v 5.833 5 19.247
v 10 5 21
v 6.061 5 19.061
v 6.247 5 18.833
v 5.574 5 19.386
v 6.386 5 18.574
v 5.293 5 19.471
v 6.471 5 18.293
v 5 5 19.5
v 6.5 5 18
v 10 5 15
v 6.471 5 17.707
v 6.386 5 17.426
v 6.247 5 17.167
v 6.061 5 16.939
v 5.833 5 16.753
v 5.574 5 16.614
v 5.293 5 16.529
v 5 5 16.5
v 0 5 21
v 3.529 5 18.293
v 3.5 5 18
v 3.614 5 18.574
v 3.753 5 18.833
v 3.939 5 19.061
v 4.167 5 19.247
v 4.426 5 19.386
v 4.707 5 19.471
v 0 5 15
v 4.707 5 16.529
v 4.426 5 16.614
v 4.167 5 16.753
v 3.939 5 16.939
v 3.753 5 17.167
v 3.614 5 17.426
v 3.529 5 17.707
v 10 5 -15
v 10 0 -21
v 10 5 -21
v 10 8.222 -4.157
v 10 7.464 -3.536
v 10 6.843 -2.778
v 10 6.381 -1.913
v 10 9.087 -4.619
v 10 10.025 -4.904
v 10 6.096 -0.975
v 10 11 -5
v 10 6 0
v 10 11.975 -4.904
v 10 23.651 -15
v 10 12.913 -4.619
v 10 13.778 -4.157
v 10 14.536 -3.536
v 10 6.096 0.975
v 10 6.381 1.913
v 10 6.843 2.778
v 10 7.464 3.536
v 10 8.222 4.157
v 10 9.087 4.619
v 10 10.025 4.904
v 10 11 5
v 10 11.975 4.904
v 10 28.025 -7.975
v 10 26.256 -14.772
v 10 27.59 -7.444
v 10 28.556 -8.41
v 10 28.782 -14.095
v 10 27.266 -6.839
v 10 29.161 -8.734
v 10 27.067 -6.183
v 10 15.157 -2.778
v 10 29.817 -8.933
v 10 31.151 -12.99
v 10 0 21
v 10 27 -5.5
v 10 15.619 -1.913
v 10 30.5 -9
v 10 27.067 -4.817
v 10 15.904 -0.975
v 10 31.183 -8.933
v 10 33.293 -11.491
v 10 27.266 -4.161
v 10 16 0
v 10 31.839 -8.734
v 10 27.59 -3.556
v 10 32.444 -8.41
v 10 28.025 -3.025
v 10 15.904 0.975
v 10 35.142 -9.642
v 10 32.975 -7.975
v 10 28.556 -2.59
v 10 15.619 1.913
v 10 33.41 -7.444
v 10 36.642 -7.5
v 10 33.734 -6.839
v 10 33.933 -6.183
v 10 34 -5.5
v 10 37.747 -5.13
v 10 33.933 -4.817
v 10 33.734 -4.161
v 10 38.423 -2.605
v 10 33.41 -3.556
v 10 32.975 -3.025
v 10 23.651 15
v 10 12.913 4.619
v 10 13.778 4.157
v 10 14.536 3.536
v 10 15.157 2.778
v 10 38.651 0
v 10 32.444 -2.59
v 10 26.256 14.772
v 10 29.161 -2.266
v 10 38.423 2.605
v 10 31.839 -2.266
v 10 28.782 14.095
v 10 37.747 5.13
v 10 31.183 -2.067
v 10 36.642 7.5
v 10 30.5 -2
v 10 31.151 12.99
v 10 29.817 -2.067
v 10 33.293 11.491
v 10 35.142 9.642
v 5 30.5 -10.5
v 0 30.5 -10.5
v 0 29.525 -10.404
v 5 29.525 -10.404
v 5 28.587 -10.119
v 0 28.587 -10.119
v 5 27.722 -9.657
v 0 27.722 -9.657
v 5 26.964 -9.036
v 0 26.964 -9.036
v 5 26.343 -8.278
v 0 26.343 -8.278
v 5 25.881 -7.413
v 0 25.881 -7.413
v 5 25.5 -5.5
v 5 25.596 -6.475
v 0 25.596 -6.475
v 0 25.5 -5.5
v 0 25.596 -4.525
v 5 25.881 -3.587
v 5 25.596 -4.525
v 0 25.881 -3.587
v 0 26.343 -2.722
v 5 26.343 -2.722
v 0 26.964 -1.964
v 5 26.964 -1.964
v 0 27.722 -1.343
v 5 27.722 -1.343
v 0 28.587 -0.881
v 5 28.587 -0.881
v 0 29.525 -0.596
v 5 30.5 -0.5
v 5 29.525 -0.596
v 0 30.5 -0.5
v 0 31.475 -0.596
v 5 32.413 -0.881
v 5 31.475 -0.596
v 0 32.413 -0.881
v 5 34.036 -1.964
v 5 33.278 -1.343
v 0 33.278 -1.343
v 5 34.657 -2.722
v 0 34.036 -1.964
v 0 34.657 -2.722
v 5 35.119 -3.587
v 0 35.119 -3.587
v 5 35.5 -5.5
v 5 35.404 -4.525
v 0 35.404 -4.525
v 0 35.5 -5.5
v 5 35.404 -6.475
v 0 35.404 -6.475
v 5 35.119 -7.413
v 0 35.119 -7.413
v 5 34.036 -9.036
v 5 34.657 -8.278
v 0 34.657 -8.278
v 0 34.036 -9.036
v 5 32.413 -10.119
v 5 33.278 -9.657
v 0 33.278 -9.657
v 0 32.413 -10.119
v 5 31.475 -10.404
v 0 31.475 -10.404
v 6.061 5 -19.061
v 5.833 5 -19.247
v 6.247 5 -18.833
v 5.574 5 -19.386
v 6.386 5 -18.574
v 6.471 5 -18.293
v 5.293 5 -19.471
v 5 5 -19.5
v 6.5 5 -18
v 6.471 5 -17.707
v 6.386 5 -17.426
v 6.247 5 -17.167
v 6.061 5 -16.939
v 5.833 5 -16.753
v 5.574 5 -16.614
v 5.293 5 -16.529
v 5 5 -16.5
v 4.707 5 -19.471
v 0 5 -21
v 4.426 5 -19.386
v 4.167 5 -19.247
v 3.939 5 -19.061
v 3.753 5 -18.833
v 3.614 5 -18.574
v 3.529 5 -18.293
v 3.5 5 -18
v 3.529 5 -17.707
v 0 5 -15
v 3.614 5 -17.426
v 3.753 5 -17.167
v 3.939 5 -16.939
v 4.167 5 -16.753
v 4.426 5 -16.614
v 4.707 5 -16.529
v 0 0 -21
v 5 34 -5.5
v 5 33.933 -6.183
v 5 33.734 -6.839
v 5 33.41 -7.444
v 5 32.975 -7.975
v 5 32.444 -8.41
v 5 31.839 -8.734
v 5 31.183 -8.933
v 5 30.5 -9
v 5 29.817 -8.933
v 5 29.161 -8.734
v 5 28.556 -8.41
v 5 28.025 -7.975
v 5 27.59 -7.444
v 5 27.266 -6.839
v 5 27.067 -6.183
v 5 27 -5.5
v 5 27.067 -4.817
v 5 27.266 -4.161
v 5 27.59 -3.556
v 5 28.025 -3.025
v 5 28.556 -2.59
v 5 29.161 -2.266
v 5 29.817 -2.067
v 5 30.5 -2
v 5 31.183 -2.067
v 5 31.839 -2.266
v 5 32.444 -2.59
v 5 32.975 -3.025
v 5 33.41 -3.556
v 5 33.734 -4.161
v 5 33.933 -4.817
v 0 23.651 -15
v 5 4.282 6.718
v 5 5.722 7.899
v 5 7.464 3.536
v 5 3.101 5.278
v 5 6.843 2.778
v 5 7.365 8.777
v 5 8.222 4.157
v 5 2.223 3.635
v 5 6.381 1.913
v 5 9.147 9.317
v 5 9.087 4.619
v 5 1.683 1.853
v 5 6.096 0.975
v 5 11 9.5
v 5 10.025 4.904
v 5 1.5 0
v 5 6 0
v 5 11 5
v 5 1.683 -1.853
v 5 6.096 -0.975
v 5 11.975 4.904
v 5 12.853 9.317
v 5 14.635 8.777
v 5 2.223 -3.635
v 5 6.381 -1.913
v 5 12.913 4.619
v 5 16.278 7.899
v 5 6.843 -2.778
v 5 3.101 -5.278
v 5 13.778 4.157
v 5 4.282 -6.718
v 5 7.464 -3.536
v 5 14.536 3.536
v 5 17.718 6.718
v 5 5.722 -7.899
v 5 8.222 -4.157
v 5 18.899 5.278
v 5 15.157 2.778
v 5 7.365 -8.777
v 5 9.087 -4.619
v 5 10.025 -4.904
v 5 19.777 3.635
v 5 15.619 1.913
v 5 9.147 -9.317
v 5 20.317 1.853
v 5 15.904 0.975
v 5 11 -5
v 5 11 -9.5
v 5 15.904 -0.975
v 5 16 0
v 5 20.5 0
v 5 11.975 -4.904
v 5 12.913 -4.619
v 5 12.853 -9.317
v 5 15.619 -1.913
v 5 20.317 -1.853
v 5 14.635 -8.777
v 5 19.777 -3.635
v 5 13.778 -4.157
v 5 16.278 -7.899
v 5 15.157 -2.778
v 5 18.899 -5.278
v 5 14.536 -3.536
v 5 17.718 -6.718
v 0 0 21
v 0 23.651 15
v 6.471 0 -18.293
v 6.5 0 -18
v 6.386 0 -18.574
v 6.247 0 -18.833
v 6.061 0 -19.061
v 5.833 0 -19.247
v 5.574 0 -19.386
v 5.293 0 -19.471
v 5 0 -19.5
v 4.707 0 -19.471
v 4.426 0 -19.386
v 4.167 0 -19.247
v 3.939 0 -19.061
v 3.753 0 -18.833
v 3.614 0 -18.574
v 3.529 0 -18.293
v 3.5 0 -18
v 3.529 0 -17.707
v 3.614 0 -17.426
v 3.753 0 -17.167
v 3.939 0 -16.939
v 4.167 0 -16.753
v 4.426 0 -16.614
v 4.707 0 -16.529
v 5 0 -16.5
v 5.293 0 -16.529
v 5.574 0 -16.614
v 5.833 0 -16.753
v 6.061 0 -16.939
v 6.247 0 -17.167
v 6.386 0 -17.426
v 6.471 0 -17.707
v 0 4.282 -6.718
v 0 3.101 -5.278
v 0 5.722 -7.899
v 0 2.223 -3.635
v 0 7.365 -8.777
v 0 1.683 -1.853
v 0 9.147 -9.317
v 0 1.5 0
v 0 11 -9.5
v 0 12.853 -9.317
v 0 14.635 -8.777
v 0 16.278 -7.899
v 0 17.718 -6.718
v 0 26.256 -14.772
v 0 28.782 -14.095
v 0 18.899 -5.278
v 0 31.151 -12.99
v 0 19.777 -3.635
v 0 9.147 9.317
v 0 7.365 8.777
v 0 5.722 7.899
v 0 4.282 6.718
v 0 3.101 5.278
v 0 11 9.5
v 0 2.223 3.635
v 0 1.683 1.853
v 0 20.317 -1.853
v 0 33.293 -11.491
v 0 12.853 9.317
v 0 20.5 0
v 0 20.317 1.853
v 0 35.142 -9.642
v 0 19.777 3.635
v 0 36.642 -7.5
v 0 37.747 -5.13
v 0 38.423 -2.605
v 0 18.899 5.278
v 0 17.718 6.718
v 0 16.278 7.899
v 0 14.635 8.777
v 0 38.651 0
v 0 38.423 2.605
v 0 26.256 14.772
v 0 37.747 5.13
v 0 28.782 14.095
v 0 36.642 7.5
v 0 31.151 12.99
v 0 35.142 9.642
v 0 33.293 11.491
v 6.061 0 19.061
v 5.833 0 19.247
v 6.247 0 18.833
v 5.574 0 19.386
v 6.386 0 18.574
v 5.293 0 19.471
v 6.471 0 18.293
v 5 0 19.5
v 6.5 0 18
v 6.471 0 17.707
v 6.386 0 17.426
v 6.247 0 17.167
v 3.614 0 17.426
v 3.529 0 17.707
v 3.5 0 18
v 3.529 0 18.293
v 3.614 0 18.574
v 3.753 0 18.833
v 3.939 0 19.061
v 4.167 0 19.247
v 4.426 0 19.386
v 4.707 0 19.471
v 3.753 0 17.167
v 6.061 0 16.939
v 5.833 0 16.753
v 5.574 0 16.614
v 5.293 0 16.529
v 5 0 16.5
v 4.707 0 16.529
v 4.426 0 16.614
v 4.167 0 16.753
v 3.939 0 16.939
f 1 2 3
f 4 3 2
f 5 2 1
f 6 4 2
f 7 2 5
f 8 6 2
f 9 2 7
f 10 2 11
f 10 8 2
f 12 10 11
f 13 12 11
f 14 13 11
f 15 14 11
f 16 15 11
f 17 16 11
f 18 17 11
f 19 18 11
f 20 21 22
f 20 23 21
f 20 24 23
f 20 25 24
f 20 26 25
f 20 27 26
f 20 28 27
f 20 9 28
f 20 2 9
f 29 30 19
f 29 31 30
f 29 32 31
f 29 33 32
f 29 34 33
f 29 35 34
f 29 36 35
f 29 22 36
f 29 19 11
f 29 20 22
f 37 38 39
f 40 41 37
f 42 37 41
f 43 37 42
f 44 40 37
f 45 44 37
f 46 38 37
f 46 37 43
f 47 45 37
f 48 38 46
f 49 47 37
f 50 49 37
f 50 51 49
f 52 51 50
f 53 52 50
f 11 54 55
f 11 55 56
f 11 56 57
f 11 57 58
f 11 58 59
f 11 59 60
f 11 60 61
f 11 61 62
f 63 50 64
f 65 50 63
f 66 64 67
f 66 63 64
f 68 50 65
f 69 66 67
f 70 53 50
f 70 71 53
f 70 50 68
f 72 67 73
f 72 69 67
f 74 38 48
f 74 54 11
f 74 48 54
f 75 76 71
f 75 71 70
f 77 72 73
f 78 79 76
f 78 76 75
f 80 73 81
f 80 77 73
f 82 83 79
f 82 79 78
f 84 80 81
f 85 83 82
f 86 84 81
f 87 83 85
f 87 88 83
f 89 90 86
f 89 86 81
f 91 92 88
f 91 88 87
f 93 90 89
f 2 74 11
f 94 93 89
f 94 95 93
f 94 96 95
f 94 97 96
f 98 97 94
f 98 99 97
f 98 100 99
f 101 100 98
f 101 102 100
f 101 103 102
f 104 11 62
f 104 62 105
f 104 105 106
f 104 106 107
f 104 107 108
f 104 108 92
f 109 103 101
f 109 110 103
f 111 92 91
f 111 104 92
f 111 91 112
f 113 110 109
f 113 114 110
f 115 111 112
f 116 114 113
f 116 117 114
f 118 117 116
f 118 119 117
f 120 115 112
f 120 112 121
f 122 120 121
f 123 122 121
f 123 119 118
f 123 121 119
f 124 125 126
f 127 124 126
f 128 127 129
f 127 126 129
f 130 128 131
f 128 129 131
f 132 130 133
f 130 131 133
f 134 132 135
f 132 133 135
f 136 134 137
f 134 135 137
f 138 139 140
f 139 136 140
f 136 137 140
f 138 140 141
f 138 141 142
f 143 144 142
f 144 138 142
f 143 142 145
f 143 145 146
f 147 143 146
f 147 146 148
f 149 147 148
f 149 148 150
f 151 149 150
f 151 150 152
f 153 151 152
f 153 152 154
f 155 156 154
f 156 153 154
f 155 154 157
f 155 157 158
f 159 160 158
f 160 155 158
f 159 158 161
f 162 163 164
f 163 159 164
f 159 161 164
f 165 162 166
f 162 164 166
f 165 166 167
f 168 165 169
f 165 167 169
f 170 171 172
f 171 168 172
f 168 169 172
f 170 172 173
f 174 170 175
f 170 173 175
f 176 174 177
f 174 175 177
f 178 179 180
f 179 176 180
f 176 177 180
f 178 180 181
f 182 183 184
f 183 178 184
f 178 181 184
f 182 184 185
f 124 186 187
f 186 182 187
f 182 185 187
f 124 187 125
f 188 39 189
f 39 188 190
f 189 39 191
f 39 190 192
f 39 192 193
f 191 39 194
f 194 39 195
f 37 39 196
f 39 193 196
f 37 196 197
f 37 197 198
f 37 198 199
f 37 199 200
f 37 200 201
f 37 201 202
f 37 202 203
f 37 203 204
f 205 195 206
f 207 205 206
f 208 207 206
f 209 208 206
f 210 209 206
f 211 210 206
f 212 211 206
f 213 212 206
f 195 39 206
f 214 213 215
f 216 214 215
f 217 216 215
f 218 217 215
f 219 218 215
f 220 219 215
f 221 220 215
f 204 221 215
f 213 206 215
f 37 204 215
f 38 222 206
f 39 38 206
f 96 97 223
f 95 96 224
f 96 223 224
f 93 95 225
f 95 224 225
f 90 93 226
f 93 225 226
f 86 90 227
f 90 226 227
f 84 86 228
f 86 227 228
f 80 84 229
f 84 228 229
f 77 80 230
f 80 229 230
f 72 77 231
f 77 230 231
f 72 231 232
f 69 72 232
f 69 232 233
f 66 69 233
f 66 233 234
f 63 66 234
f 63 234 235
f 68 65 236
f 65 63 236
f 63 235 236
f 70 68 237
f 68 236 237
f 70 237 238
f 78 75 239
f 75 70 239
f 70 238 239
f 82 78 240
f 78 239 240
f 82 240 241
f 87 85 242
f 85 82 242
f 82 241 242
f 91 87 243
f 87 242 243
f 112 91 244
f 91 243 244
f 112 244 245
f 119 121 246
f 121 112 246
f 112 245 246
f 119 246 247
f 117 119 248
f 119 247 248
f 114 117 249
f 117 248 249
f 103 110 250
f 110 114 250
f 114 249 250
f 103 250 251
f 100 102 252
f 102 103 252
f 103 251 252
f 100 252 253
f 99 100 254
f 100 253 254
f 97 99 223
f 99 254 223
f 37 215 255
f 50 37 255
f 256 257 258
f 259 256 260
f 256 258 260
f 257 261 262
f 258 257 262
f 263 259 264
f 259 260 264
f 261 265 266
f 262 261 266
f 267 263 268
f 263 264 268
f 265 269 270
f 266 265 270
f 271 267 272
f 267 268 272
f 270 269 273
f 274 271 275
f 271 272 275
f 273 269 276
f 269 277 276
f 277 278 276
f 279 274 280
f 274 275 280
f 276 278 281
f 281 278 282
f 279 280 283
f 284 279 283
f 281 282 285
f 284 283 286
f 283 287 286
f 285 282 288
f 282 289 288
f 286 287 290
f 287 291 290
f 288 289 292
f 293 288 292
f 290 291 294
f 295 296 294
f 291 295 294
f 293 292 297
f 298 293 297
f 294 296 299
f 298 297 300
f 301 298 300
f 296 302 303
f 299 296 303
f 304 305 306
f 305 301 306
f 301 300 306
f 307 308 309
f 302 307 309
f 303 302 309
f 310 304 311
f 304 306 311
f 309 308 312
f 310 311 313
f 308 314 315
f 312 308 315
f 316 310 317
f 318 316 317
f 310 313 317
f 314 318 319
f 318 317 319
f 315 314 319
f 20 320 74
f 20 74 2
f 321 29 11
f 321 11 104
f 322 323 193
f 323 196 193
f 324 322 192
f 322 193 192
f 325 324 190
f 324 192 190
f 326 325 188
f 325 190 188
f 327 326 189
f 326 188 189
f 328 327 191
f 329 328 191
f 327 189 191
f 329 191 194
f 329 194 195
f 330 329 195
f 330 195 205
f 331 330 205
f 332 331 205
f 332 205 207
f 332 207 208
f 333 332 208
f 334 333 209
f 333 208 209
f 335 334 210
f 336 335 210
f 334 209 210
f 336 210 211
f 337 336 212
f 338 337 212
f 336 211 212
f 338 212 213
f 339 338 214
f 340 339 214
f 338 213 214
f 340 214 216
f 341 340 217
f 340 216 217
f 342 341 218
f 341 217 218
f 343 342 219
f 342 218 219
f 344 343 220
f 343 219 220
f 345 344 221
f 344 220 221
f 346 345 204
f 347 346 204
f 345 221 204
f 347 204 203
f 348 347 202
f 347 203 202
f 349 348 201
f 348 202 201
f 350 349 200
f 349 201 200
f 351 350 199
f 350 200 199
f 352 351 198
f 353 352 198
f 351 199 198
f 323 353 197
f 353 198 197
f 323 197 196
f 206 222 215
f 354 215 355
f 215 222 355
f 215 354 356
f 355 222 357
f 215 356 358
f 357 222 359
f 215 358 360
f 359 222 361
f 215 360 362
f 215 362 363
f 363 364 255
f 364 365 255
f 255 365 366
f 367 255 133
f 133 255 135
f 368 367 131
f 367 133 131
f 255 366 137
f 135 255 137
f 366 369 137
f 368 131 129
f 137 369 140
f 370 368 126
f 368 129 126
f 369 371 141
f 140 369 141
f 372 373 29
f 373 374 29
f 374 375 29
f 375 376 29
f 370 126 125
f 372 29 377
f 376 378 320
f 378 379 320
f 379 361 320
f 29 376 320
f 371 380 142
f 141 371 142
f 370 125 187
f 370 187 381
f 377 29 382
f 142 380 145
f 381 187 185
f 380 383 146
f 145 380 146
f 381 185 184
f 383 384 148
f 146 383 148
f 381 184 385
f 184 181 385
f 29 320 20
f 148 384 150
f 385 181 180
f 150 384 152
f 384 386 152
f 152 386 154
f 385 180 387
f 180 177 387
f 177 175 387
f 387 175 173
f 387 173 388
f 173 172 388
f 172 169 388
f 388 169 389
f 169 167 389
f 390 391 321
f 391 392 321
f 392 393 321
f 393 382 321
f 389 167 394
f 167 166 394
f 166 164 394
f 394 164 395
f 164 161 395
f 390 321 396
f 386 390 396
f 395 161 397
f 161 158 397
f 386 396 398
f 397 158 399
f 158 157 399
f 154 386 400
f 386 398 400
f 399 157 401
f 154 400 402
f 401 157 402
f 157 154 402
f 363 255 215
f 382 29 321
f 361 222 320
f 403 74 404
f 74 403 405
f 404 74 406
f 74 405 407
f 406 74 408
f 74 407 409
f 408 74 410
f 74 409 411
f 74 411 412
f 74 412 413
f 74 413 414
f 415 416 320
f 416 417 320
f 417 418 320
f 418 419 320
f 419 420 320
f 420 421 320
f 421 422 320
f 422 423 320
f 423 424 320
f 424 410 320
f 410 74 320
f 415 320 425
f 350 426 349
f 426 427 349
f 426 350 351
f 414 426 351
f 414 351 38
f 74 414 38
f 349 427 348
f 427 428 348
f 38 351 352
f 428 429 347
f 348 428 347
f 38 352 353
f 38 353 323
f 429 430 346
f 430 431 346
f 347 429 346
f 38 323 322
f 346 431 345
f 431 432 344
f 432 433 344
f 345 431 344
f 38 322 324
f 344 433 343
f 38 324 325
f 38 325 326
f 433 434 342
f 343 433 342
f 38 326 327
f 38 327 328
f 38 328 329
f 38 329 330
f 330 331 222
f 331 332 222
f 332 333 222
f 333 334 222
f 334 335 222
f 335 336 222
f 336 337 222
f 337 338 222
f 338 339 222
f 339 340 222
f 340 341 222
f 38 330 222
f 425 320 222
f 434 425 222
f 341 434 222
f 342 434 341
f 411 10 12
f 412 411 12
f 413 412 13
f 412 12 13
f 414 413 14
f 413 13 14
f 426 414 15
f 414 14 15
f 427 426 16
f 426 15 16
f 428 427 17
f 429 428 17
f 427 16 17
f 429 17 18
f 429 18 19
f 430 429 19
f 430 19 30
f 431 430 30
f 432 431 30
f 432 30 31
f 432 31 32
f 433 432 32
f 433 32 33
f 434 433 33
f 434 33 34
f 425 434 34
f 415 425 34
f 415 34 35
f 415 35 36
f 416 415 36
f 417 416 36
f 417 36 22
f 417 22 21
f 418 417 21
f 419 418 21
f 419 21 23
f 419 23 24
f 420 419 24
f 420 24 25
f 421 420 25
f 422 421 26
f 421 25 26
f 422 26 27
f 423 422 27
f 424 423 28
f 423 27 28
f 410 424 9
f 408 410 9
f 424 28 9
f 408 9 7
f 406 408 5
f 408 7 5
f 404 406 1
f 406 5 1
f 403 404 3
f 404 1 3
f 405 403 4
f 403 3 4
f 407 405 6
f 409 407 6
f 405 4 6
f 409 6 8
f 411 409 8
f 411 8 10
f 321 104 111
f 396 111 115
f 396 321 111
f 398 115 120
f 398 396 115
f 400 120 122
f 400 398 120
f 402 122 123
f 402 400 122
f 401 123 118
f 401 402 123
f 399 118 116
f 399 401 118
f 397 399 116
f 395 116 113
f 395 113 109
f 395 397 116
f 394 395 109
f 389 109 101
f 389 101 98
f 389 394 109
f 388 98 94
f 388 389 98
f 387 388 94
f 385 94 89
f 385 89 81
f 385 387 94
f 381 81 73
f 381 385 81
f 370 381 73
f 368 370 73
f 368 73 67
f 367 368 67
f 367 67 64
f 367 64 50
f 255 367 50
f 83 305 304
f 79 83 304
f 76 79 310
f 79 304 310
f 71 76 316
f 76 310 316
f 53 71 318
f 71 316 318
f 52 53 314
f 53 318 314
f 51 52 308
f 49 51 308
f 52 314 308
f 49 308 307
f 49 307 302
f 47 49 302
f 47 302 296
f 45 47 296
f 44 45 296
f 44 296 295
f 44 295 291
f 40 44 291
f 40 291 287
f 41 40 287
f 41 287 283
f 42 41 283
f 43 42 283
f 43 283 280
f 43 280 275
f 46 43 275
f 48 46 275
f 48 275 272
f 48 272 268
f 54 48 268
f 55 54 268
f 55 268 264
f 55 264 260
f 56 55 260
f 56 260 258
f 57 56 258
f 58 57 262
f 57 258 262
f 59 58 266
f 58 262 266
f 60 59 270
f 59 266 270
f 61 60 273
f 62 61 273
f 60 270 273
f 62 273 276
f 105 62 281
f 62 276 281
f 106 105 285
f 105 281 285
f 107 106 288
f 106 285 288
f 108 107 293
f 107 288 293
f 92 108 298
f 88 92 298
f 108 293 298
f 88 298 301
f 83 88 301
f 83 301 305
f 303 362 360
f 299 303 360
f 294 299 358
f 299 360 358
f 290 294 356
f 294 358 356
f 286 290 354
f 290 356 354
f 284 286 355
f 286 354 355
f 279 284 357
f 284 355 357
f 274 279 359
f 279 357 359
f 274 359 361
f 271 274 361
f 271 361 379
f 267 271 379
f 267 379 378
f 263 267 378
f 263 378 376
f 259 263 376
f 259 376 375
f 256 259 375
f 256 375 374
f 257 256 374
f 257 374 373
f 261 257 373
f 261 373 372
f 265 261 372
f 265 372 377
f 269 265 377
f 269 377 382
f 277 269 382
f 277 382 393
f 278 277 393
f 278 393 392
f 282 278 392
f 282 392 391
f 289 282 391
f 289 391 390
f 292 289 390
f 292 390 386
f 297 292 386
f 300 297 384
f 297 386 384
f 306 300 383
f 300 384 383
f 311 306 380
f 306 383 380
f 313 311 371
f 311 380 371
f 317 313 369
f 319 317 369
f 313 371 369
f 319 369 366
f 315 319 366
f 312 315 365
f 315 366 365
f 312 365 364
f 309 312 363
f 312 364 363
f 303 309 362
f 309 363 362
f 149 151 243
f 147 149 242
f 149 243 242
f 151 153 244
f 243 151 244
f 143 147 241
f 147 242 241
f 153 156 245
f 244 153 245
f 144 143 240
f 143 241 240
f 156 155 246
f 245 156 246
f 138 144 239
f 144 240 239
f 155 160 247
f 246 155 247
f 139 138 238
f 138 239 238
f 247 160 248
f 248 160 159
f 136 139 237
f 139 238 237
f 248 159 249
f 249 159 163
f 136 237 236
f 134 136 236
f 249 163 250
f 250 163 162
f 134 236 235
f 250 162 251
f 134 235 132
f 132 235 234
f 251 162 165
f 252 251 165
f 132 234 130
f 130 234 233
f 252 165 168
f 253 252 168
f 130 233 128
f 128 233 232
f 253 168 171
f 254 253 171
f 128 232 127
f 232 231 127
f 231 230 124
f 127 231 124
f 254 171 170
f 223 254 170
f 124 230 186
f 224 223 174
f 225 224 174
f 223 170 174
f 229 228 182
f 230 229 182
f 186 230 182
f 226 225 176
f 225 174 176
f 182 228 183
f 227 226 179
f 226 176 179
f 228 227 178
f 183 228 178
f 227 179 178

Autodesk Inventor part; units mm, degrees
sketch "Sketch1" plane through (0, 0, 0) normal (1, 0, 0) x (0, 1, 0)
  circle A0 centre (30.5, -5.5) radius 3.5
  line L0 (11, 15) -> (5, 15)
  line L1 (5, -15) -> (11, -15)
  line L2 (0, -21) -> (5, -21)
  line L3 (5, -21) -> (5, -15)
  line L4 (0, 21) -> (5, 21)
  line L5 (5, 21) -> (5, 15)
  line L6 (-7.7302, 0) -> (46.3815, 0) projected
  line L7 (0, 29.4) -> (0, -29.4) projected
  line L8 (0, 21) -> (0, -21)
  line L9 (11, -15) -> (23.6512, -15)
  line L10 (11, 15) -> (23.6512, 15)
  arc A1 (23.6512, -15) -> (23.6512, 15) centre (23.6512, 0) ccw
  circle A2 centre (11, 0) radius 5
  point P0 (2.5, -21)
  dimension "d7" = 7
  dimension "d45" = 21
  dimension "d64" = 5
  dimension "d65" = 21
  dimension "d66" = 5
  dimension "d67" = 15
  dimension "d69" = 5.5
  dimension "d73" = 0
  dimension "d74" = 30.5
  dimension "d75" = 10
  dimension "d76" = 0
  dimension "d77" = 11
  dimension "d78" = 15
  dimension "d79" = 15
  dimension "d80" = 23.6512
extrude "Extrusion1" add sketch "Sketch1" along normal blind 10 contours L10 A1 L6 A2 L7 L4 L5 L0 | A1 L9 L1 L3 L2 L7 L6 A2
sketch "Sketch4" plane through (10, 0, 0) normal (1, 0, 0) x (0, 0, -1)
  circle A0 centre (0, 11) radius 9.5
  circle A1 centre (5.5, 30.5) radius 5
  line L0 (-29.4, 0) -> (29.4, 0) projected
  line L1 (0, -7.7302) -> (0, 46.3815) projected
  point P0 (0, 0)
  dimension "d56" = 19
  dimension "d57" = 10
  dimension "d58" = 11
  dimension "d59" = 0
  dimension "d60" = 30.5
  dimension "d61" = 5.5
extrude "Extrusion2" cut sketch "Sketch4" along normal blind 5 from surface at -10
sketch "Sketch6" plane through (0, 5, -15) normal (0, 1, 0) x (1, 0, 0)
  circle A0 centre (5, 3) radius 1.5
  line L0 (12, -15) -> (-2, -15) projected
  circle A1 centre (5, -33) radius 1.5
  line L1 (0, -30) -> (0, -36) projected
  line L2 (0, 6) -> (0, 0) projected
  point P0 (0, -15)
  point P1 (0, -33)
  point P2 (0, 3)
  dimension "d81" = 3
  dimension "d82" = 18
  dimension "d83" = 3
  dimension "d84" = 18
  dimension "d85" = 5
  dimension "d86" = 5
extrude "Extrusion3" cut sketch "Sketch6" against normal blind 5
